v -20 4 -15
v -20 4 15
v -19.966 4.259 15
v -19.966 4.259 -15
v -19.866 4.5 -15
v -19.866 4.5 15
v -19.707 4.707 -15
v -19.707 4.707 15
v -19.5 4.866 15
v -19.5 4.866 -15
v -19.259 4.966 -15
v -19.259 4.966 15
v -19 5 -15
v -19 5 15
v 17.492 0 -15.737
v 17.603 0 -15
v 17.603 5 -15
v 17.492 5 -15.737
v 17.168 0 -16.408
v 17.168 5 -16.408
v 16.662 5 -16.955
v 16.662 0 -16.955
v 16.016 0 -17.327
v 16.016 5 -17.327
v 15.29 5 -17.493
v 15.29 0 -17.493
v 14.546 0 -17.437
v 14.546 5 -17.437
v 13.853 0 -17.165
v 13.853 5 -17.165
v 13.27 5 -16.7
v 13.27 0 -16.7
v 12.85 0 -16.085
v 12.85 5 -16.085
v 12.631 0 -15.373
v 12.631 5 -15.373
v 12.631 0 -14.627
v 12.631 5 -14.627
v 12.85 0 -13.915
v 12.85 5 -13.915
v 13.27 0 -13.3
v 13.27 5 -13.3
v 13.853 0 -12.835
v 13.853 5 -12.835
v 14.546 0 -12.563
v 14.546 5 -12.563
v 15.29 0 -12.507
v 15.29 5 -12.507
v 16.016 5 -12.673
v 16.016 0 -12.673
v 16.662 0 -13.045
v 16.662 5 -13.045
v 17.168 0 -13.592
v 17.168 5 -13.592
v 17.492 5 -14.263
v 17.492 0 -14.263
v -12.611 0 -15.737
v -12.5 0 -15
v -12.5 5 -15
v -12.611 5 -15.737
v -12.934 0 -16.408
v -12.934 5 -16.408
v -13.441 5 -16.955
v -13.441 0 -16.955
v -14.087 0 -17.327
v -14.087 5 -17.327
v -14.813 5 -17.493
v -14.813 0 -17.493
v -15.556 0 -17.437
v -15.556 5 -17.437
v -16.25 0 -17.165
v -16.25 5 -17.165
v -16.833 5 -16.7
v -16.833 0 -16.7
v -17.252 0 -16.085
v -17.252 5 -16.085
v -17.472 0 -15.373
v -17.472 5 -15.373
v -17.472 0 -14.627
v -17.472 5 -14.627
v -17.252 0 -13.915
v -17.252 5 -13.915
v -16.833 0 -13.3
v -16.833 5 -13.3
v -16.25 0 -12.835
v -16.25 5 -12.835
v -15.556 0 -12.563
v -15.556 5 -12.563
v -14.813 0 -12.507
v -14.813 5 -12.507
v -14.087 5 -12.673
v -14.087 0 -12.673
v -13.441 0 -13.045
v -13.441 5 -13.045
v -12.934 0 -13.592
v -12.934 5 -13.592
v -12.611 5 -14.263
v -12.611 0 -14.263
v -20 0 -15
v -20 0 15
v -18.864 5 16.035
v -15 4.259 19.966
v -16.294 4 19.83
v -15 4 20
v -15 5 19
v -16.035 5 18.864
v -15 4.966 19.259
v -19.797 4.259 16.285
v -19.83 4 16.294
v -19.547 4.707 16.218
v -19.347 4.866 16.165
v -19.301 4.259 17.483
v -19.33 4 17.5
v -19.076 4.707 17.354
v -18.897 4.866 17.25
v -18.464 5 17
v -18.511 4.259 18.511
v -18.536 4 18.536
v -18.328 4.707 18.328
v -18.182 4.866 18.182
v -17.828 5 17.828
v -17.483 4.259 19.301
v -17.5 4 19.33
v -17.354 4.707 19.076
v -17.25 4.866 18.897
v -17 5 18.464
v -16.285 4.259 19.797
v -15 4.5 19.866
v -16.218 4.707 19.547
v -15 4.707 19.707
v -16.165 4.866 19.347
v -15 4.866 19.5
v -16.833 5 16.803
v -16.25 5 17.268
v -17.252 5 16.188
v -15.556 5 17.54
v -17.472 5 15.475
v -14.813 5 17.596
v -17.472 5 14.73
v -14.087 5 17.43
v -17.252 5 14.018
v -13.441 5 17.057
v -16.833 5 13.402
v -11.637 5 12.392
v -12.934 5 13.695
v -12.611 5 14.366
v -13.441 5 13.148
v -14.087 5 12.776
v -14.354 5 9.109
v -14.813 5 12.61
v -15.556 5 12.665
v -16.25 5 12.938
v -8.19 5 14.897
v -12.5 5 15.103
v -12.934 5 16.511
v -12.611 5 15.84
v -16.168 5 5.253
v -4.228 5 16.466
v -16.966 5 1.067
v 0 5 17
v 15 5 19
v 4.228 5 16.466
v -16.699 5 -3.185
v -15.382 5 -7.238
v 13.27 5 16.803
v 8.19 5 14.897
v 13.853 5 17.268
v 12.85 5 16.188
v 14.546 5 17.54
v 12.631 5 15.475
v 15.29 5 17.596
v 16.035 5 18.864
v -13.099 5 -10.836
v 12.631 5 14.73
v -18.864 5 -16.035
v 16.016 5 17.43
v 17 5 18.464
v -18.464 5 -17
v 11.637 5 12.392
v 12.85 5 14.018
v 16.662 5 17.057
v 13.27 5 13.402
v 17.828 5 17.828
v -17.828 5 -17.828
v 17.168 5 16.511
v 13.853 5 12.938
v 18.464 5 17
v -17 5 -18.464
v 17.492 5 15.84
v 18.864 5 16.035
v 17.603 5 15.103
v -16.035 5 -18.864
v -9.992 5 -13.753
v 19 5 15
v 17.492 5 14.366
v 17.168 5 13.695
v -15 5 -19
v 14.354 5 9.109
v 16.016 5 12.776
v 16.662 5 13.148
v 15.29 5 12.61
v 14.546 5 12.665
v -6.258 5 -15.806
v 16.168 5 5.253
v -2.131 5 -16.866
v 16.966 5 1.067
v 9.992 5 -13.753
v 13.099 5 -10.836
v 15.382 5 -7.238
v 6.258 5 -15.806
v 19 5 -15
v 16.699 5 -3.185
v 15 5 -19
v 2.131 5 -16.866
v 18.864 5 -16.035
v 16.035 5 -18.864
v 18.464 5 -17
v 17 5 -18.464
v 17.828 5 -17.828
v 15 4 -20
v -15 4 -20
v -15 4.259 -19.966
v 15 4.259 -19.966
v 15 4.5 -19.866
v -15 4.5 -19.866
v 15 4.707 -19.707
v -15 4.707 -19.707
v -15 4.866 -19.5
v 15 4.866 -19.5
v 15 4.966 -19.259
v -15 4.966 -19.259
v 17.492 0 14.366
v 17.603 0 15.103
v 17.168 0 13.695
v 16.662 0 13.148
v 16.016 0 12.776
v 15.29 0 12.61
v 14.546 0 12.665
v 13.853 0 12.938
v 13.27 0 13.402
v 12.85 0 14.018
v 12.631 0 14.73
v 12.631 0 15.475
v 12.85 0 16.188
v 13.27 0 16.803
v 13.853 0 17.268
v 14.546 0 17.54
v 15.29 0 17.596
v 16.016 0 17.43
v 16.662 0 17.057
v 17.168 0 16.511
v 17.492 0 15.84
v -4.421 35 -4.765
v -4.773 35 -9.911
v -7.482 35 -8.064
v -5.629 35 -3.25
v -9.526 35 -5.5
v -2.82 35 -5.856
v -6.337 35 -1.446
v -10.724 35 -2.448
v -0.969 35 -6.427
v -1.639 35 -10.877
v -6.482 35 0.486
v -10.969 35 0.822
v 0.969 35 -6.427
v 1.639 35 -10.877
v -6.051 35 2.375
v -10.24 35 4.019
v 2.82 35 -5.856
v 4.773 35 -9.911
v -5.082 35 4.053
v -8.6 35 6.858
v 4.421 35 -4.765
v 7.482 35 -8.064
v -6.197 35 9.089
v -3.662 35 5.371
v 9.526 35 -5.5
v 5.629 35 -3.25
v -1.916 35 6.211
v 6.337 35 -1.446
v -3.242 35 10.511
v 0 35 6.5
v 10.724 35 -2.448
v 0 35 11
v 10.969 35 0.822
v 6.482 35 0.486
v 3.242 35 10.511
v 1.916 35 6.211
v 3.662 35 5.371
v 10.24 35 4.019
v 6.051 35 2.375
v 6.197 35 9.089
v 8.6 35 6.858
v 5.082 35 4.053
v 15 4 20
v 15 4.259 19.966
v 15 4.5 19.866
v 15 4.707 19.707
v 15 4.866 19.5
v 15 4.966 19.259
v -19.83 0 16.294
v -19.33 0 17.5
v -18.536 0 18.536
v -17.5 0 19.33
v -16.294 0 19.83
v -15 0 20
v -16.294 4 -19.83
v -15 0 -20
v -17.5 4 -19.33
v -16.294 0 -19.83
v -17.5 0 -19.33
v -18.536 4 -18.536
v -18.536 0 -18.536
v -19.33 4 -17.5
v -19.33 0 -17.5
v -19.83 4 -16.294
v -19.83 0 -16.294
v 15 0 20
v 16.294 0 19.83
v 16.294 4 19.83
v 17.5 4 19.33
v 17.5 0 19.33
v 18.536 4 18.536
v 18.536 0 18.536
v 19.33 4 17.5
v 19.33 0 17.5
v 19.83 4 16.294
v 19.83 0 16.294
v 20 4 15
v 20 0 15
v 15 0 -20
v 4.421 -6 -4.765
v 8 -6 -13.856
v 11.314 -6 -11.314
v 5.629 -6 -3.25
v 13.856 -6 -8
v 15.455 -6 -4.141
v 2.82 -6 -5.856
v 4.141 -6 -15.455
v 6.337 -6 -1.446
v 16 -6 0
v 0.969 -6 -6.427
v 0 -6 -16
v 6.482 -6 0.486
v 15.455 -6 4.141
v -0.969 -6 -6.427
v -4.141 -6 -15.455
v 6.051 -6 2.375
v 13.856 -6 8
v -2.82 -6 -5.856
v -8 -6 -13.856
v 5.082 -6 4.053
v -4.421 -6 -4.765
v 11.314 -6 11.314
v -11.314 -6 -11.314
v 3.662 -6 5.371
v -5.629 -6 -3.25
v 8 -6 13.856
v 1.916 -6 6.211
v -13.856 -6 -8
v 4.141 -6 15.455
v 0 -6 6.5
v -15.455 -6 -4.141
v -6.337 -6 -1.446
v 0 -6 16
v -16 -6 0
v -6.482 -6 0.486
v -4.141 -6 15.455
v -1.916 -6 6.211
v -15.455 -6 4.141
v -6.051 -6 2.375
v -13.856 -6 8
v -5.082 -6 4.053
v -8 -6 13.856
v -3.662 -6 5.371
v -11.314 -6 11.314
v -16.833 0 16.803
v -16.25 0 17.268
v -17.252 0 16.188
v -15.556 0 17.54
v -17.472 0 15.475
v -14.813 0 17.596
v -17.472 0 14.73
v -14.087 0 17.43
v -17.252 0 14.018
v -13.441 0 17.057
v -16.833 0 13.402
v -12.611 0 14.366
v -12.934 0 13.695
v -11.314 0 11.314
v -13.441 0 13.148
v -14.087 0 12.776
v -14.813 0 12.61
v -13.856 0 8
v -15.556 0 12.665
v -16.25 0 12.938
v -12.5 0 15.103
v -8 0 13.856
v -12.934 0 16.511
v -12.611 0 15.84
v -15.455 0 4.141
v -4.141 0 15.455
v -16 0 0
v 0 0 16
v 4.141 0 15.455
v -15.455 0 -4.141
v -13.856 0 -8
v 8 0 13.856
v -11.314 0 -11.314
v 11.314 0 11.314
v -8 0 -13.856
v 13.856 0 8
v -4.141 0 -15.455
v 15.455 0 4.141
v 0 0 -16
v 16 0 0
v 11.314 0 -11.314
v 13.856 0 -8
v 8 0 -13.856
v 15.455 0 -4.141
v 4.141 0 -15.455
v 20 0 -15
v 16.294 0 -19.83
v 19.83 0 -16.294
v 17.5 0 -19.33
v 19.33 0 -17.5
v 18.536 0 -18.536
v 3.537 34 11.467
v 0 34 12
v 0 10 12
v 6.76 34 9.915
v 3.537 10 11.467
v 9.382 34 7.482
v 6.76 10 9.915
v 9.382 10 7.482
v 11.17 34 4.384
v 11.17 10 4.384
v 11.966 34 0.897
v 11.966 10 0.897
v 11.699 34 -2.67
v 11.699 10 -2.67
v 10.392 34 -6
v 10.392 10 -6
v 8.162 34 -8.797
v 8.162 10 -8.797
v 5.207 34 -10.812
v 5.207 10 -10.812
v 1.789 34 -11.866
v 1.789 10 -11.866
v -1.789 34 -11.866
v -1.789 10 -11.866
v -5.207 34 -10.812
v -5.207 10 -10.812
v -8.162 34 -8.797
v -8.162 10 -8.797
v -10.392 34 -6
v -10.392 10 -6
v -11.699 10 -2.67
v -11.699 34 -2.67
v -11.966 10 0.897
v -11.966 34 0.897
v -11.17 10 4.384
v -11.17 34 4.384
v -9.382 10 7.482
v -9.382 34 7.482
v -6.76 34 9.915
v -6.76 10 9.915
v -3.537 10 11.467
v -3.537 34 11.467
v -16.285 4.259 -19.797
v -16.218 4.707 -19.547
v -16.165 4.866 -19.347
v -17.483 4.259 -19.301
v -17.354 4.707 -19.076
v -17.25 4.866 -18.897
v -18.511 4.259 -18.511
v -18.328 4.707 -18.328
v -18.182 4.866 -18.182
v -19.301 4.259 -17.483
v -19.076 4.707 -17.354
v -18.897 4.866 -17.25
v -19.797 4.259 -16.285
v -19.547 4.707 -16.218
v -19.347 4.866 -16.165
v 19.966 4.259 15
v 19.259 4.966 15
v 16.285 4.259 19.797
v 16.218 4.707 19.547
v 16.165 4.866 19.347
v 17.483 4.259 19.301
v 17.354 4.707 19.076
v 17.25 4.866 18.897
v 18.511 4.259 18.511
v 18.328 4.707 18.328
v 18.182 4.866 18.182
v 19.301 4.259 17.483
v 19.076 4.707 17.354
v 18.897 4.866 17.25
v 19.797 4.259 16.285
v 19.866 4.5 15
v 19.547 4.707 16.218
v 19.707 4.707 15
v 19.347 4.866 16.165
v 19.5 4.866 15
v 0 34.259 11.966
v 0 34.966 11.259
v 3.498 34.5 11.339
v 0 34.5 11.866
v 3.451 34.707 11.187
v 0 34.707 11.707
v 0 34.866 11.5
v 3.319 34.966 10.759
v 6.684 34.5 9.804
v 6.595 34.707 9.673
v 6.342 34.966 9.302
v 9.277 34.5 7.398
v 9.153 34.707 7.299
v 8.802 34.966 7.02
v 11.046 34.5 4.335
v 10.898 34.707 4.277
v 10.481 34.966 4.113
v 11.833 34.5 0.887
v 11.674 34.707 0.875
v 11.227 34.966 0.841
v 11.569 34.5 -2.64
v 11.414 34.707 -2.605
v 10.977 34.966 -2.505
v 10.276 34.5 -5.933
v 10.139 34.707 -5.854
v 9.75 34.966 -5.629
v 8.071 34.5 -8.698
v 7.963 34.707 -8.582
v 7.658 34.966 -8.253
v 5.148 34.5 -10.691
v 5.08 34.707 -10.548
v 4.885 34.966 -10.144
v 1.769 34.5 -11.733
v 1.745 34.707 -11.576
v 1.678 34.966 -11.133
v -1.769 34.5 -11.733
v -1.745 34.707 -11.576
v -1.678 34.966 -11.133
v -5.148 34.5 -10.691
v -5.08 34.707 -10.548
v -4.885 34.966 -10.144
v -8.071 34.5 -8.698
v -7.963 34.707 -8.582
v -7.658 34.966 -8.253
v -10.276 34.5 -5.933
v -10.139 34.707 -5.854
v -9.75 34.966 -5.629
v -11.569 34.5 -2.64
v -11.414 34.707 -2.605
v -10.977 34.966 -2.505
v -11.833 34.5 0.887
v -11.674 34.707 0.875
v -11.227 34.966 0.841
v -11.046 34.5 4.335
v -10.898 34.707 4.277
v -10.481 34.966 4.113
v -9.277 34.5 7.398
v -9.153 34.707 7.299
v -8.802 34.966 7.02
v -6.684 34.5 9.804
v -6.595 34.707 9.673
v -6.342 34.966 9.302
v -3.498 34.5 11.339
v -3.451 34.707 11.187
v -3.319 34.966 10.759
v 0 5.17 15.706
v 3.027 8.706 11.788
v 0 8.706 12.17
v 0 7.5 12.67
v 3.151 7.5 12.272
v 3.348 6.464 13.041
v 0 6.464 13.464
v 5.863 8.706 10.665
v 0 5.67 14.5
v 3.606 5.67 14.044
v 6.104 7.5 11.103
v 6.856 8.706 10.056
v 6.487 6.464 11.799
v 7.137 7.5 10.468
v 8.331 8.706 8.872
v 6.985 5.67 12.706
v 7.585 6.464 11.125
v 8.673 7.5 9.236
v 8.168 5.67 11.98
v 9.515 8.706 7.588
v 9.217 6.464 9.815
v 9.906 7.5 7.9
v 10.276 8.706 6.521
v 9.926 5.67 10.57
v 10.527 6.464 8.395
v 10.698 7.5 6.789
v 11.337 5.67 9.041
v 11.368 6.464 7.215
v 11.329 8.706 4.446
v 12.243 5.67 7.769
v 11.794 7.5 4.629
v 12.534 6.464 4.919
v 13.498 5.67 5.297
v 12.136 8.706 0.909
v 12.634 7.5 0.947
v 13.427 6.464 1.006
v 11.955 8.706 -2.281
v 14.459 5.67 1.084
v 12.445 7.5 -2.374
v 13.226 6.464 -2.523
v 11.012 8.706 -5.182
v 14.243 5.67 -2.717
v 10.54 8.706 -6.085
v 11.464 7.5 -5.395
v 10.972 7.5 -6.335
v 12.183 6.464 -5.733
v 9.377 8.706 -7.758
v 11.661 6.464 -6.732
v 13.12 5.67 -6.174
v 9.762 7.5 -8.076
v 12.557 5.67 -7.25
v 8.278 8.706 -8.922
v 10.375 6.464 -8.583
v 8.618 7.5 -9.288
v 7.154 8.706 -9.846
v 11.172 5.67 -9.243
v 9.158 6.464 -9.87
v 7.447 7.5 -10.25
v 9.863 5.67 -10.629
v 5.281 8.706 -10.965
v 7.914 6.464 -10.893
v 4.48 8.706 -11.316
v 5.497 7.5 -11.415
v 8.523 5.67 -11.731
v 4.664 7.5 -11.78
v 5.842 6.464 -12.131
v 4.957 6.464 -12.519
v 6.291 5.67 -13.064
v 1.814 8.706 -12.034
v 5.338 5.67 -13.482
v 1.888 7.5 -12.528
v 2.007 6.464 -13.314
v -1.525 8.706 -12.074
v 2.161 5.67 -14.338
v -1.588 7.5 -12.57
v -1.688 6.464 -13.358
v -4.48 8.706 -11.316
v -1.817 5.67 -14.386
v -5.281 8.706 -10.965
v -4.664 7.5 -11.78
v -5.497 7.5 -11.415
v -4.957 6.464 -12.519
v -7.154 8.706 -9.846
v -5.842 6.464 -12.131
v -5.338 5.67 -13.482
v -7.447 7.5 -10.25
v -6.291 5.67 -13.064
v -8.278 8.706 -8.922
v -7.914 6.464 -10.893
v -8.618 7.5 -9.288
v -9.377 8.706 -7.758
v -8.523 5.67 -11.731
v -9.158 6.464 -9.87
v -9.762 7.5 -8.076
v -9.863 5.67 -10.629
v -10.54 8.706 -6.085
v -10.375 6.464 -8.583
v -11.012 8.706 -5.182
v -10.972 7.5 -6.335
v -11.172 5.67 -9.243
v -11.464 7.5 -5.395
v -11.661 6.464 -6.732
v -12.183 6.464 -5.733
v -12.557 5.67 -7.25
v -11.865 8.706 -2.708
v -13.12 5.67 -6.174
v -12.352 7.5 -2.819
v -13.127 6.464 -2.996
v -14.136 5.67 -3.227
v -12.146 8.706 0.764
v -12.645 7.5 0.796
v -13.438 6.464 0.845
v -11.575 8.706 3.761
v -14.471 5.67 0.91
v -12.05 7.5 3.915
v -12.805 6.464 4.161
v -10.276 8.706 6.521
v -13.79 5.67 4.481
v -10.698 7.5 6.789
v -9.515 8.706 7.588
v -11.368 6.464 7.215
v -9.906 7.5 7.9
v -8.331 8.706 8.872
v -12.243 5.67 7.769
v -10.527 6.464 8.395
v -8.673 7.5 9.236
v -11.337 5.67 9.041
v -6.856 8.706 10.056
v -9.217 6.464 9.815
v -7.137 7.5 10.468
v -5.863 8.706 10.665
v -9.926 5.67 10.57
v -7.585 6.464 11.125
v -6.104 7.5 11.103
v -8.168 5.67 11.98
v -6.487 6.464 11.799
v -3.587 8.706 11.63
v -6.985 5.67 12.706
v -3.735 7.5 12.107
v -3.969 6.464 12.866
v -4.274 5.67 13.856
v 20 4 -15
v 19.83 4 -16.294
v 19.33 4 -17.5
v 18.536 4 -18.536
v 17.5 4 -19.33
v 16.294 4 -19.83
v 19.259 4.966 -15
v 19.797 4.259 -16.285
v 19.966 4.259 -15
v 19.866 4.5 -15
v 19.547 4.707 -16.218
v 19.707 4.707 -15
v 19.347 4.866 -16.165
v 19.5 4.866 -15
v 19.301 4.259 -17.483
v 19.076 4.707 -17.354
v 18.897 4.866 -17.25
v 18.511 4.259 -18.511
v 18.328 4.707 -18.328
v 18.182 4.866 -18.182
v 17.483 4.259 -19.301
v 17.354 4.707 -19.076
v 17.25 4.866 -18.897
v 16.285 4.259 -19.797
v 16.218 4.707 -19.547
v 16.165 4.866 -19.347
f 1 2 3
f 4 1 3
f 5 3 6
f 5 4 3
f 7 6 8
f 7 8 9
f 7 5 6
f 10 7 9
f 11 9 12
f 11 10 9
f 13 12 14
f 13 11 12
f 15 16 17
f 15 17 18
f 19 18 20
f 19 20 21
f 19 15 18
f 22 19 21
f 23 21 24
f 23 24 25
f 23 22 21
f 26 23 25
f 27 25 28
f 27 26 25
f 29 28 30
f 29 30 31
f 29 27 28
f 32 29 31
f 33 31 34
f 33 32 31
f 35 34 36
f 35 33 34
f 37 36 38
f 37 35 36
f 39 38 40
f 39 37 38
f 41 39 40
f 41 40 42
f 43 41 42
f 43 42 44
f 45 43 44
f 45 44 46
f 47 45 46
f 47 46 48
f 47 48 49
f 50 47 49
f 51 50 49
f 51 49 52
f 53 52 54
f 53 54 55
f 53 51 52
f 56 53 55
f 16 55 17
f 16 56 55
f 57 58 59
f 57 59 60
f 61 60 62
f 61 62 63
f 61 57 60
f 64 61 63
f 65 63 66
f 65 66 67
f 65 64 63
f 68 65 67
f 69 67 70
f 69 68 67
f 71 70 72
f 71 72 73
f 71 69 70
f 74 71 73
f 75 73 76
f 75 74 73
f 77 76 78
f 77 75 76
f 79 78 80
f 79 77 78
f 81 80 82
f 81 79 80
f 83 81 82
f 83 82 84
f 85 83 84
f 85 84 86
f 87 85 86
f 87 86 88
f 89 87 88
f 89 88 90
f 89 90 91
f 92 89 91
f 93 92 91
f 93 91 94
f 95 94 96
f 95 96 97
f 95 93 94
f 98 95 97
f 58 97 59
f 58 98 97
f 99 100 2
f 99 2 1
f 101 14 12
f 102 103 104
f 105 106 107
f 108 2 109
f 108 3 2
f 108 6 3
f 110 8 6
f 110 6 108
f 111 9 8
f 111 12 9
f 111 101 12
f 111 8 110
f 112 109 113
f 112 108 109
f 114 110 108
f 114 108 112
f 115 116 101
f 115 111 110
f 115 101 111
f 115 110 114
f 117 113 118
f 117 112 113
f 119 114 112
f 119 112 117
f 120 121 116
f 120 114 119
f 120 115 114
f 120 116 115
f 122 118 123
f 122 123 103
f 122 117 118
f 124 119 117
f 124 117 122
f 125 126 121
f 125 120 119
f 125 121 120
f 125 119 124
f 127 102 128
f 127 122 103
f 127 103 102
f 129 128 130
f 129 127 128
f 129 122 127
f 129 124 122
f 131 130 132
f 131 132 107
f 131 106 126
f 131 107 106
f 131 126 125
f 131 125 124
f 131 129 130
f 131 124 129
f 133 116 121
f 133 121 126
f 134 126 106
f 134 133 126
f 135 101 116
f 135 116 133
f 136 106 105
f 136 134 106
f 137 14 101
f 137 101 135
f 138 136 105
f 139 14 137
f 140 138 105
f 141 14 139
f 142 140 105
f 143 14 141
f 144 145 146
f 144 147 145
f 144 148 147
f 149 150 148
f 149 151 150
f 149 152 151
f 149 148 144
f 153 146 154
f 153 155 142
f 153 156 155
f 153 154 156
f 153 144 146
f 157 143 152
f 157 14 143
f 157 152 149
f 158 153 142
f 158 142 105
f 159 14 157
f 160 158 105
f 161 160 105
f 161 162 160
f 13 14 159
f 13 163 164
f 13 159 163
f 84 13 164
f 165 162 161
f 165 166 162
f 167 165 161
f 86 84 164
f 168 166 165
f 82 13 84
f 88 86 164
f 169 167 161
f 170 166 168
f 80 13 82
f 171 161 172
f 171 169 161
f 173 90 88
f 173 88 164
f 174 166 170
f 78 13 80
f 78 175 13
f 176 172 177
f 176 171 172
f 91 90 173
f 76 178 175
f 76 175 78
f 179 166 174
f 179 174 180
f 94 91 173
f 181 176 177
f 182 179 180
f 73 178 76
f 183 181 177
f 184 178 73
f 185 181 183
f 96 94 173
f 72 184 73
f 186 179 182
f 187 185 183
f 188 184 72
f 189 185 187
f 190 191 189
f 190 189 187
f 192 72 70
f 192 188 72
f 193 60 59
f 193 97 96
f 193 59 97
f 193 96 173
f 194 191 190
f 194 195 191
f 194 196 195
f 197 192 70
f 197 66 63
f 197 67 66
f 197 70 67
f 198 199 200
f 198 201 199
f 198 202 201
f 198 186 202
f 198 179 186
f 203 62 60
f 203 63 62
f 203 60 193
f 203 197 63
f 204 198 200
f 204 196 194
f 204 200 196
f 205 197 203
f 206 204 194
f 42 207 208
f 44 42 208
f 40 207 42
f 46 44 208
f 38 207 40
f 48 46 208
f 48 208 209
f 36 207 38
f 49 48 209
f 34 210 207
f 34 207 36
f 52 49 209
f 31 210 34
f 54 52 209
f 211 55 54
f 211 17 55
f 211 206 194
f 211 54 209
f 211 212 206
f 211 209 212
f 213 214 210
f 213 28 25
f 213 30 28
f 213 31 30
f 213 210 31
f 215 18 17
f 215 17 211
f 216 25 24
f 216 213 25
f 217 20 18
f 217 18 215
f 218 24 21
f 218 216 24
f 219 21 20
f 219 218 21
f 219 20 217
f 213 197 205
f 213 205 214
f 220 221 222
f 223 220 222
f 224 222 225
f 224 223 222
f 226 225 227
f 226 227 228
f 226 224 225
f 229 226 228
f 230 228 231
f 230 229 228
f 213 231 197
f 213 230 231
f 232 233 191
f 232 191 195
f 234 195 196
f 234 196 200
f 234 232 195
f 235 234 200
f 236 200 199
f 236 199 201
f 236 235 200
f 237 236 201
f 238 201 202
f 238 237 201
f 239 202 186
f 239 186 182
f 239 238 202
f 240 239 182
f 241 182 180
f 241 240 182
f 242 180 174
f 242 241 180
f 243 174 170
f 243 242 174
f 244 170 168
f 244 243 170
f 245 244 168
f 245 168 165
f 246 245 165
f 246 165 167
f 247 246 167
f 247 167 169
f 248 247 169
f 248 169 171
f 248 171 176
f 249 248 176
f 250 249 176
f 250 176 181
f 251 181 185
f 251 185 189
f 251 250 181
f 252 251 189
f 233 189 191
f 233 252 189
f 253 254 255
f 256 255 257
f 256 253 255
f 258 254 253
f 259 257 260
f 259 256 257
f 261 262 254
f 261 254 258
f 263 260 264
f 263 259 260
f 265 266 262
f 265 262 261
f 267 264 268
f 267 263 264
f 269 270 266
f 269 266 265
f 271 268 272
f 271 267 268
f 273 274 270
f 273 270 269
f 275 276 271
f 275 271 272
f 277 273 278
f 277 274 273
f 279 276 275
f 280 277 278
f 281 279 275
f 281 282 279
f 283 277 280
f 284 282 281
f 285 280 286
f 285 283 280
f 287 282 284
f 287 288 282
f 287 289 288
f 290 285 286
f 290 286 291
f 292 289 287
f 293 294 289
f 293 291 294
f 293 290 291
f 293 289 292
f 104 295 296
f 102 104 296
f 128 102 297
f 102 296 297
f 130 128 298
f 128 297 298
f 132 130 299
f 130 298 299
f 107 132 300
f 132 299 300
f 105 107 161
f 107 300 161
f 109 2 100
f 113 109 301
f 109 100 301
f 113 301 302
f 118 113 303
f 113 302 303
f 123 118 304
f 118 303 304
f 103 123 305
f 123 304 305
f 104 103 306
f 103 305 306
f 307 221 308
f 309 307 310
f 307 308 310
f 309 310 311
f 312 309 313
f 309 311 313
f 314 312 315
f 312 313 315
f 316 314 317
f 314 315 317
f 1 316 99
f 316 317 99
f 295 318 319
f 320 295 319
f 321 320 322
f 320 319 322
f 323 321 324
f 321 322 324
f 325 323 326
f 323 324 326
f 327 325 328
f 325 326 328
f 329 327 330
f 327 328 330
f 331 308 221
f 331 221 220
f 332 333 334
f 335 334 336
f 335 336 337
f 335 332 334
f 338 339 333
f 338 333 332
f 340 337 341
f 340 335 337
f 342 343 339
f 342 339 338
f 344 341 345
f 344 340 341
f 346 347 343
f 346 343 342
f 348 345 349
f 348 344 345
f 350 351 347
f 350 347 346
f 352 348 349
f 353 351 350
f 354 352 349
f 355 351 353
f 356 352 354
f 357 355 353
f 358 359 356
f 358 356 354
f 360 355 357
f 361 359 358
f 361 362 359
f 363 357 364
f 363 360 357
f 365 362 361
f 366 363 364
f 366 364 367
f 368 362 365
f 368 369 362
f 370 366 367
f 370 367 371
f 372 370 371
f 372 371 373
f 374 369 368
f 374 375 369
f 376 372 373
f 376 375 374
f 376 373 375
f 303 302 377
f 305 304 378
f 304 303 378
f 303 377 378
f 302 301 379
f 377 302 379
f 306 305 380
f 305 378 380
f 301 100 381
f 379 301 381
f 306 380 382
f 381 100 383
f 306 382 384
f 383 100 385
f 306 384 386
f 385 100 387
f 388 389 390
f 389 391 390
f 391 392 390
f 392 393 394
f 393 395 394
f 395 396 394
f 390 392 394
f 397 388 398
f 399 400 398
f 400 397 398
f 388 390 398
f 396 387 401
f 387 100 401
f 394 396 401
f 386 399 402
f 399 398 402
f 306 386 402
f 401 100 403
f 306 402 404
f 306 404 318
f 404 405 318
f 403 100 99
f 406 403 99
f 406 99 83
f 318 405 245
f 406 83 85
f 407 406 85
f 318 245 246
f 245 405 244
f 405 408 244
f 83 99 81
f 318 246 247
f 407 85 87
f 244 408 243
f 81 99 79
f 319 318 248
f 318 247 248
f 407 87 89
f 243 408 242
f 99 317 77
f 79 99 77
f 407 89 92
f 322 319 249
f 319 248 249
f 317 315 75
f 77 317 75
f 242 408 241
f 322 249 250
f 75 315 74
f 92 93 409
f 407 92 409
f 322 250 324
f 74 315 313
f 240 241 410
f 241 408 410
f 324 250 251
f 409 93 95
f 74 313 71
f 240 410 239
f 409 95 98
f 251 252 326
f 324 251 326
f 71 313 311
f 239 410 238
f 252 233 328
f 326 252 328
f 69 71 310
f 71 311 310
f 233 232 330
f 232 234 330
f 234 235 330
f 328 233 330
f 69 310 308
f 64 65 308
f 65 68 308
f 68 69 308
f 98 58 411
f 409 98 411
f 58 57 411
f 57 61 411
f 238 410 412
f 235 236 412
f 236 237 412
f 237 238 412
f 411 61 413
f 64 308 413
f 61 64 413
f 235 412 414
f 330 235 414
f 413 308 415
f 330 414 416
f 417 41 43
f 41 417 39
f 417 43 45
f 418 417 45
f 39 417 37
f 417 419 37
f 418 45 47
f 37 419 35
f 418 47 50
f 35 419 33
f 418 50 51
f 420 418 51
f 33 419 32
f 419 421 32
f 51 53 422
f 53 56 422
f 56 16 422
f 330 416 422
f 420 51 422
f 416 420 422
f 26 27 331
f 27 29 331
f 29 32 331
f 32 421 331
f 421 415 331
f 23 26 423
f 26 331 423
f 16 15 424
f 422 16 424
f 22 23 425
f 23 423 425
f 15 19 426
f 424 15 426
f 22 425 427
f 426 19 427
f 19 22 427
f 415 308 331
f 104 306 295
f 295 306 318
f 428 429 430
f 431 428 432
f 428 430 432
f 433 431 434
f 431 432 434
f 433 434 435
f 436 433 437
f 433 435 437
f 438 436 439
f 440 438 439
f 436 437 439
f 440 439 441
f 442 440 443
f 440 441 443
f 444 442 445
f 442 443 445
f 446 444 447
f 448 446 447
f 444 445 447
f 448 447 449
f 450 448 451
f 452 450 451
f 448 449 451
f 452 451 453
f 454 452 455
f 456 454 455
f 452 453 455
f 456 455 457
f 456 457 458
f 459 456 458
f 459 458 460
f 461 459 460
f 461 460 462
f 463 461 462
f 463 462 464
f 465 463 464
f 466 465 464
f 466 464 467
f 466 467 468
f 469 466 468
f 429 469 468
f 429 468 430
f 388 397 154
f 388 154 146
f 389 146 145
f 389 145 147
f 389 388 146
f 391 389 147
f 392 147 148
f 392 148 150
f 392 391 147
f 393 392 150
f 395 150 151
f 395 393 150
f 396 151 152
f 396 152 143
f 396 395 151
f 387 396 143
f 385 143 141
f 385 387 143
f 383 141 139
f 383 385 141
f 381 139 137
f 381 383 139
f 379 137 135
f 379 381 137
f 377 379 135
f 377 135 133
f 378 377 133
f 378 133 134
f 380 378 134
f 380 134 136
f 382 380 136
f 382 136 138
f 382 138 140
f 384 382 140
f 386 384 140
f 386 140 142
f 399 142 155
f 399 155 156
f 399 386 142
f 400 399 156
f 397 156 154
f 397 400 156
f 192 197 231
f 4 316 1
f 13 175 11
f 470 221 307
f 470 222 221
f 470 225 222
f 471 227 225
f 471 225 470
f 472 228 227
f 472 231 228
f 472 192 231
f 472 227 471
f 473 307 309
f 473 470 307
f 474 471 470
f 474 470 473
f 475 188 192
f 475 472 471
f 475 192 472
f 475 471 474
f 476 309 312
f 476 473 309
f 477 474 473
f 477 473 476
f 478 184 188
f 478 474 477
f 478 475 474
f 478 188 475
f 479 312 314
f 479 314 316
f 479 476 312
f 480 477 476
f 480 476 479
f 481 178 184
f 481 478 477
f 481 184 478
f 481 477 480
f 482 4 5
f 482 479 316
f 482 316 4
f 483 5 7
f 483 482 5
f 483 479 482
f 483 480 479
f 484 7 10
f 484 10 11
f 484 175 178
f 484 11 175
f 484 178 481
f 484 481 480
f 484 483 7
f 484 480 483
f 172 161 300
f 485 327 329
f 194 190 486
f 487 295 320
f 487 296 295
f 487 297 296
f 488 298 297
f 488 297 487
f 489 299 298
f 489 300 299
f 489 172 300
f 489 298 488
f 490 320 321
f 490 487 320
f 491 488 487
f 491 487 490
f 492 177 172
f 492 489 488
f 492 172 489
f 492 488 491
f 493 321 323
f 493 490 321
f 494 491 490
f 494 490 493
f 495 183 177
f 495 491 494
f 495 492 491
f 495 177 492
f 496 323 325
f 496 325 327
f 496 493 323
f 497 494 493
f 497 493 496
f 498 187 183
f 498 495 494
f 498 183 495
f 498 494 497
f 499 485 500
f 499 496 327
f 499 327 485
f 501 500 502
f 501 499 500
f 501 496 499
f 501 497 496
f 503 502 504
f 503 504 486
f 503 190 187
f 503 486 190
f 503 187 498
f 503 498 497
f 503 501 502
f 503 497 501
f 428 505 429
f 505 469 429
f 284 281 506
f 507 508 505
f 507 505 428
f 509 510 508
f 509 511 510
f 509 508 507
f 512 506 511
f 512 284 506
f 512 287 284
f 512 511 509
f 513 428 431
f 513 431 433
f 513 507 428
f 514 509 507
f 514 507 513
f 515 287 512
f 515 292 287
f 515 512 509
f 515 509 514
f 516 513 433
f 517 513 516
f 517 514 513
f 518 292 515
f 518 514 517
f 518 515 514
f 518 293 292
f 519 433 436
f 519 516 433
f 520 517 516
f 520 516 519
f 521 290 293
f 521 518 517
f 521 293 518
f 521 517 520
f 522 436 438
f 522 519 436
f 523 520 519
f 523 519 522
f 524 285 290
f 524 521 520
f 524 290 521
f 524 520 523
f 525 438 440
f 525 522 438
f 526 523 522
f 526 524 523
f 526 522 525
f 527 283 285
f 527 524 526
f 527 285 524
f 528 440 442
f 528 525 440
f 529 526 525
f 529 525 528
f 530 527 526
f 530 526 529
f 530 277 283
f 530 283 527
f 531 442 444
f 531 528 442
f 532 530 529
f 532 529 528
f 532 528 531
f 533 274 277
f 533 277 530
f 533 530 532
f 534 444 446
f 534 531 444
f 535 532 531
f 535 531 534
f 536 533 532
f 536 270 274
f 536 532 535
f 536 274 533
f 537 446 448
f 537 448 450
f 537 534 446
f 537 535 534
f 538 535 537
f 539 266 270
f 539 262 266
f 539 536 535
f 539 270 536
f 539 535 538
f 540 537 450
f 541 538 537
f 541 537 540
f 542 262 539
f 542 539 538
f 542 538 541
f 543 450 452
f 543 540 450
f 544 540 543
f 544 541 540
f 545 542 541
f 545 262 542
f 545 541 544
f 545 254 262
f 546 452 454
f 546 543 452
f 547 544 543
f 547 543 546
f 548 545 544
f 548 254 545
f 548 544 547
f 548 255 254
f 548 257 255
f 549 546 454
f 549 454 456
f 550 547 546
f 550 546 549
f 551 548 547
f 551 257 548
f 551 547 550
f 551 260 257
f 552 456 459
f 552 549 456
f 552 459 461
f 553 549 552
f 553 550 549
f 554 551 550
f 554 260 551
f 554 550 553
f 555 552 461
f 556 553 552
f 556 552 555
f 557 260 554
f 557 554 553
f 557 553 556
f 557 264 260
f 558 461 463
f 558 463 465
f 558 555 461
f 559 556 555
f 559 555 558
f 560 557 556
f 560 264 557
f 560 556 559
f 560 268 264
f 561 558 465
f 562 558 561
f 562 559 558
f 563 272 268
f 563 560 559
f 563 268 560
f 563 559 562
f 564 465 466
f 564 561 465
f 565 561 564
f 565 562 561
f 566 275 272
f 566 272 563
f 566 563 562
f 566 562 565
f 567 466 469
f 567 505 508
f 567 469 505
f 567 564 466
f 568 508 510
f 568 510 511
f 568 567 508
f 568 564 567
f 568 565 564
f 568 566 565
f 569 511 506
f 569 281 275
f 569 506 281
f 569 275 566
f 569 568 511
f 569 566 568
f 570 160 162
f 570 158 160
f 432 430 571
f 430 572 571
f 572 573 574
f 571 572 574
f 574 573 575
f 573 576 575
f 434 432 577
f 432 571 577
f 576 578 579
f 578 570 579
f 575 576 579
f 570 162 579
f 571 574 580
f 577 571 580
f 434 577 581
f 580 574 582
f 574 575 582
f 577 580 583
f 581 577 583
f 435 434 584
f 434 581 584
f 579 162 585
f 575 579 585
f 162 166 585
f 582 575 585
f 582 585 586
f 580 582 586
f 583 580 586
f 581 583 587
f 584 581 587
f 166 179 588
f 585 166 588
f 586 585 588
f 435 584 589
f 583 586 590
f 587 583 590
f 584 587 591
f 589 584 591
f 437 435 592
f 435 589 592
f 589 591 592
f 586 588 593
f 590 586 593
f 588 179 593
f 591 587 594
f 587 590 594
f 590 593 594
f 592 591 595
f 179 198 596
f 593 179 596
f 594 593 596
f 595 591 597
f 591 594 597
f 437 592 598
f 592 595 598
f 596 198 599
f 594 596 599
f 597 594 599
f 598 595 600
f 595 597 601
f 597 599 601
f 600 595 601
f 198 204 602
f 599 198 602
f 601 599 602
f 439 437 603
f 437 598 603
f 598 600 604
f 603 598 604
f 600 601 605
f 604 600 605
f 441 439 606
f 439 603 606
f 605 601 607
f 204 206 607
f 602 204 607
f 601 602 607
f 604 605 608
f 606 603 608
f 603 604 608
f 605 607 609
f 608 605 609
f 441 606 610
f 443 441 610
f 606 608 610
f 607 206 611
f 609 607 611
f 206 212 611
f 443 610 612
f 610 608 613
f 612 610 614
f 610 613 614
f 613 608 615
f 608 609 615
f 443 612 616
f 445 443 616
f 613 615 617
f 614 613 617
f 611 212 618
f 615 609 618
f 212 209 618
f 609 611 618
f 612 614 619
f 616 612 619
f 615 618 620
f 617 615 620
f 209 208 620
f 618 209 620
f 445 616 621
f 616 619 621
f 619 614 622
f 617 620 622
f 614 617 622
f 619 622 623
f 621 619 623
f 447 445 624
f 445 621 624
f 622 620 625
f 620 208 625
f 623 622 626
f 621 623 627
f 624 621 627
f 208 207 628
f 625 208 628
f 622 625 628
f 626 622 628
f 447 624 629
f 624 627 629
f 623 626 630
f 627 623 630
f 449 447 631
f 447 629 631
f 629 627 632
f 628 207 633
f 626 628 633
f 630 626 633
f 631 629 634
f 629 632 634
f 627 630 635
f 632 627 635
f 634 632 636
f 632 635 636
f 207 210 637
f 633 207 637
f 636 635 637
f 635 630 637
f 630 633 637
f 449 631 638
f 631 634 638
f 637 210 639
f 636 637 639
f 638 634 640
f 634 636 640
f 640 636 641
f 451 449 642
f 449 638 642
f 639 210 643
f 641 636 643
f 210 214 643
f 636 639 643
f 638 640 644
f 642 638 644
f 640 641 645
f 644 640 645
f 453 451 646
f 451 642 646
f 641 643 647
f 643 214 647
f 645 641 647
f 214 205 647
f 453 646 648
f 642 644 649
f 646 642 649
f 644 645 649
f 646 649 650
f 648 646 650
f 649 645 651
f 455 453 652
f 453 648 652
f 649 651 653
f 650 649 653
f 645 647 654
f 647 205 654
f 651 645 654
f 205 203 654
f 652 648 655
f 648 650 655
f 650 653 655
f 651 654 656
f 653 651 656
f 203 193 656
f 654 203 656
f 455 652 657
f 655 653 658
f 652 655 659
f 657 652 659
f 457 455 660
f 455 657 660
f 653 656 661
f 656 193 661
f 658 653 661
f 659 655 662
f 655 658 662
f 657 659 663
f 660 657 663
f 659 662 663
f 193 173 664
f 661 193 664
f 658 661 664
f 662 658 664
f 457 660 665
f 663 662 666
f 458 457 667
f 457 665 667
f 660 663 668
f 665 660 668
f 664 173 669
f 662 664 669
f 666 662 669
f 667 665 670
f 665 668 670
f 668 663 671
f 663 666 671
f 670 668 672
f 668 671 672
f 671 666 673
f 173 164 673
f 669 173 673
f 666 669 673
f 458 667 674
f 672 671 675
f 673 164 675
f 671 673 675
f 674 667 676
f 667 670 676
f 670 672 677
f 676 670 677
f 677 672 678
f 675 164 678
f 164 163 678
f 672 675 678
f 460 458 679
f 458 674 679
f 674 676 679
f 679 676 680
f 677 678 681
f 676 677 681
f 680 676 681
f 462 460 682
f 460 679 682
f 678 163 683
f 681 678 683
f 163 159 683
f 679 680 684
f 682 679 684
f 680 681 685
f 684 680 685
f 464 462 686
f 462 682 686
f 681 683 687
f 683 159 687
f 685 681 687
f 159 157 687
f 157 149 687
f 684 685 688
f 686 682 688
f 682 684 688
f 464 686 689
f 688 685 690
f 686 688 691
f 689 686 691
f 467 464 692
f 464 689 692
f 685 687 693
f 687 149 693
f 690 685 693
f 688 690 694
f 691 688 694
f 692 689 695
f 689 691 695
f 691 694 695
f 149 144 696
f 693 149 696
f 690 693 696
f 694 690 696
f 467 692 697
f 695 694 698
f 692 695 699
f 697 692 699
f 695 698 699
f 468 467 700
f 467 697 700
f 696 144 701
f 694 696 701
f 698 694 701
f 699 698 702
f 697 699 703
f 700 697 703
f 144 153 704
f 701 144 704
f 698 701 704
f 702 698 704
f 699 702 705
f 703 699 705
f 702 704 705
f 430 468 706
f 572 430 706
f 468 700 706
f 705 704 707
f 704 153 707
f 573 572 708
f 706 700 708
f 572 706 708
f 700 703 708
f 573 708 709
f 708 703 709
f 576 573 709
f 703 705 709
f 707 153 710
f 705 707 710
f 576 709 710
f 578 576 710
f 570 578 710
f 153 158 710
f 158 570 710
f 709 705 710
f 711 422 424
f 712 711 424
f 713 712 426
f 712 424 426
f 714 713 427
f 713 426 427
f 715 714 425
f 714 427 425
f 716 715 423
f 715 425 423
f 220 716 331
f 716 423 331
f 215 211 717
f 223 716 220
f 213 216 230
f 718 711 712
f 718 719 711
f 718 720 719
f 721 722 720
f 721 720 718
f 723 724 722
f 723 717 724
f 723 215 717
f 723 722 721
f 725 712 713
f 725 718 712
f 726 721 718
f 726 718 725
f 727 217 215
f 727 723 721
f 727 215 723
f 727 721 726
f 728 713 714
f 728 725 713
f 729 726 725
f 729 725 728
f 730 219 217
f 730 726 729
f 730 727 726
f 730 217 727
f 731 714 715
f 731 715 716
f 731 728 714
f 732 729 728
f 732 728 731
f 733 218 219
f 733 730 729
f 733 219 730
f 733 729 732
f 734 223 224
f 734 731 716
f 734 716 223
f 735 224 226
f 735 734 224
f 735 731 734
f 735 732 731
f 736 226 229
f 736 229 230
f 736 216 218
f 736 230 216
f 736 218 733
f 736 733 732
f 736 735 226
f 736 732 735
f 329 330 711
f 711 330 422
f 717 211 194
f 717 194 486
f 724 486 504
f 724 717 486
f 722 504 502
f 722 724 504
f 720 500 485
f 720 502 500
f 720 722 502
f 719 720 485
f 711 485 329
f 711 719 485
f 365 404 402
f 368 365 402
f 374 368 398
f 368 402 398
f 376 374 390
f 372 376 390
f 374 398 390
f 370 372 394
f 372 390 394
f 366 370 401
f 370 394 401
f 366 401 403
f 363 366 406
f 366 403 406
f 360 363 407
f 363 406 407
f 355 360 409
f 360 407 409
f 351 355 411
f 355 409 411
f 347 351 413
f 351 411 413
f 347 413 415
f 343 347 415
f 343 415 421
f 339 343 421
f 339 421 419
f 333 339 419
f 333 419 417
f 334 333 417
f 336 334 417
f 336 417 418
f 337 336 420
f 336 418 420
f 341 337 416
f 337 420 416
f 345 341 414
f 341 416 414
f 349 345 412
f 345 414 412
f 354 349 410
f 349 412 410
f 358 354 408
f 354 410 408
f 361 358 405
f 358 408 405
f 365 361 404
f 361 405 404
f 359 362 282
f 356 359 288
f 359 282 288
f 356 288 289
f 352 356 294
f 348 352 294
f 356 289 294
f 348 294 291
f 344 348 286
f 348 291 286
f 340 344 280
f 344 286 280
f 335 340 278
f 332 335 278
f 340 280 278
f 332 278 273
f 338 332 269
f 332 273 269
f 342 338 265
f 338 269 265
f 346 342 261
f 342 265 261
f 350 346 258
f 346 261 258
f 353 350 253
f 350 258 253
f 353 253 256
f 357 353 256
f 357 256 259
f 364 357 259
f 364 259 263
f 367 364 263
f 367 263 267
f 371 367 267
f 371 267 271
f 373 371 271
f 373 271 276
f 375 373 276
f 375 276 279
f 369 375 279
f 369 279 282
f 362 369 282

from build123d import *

# Parameters (mm, degrees)
BOSS_EXTRUDE13_OUTLINE_W = 40
BOSS_EXTRUDE13_OUTLINE_H = 40
BOSS_EXTRUDE13_OUTLINE_R = 2.5
BOSS_EXTRUDE13_DEPTH     = 5
SKETCH3_R                = 12
BOSS_EXTRUDE17_DEPTH     = 30
FILLET2_R                = 1
FILLET3_R                = 5
FILLET4_R                = 1
SKETCH6_R                = 16
BOSS_EXTRUDE18_DEPTH     = 6
SKETCH5_R                = 6.5
CUT_EXTRUDE2_DEPTH       = 55


# Read off the part's stored shape, not the designer's step: Boss-Extrude13
with BuildPart() as part:
    # Boss-Extrude13 outline → Boss-Extrude13 (new body)
    with BuildSketch(Plane(origin=(0, 0, 0), x_dir=(1, 0, 0), z_dir=(0, 1, 0))):
        Rectangle(BOSS_EXTRUDE13_OUTLINE_W, BOSS_EXTRUDE13_OUTLINE_H)
        with Locations((-15, -15.102802021)):
            Circle(BOSS_EXTRUDE13_OUTLINE_R, mode=Mode.SUBTRACT)
        with Locations((15.102802021, -15.102802021)):
            Circle(BOSS_EXTRUDE13_OUTLINE_R, mode=Mode.SUBTRACT)
        with Locations((-15, 15)):
            Circle(BOSS_EXTRUDE13_OUTLINE_R, mode=Mode.SUBTRACT)
        with Locations((15.102802021, 15)):
            Circle(BOSS_EXTRUDE13_OUTLINE_R, mode=Mode.SUBTRACT)
    extrude(amount=BOSS_EXTRUDE13_DEPTH)

    # Sketch3 → Boss-Extrude17 (add)
    with BuildSketch(Plane(origin=(0, 5, 0), x_dir=(1, 0, 0), z_dir=(0, 1, 0))):
        with Locations(Location((0, 0, 0), (0, 0, 270))):
            Circle(SKETCH3_R)
    extrude(amount=BOSS_EXTRUDE17_DEPTH)

    # Fillet2
    fillet2_edges = [part.edges().sort_by_distance(p)[0] for p in [
        (20, 5, 0),
        (0, 5, -20),
        (-20, 5, 0),
        (0, 5, 20),
    ]]
    fillet(fillet2_edges, radius=FILLET2_R)

    # Fillet3
    # the kernel refuses this fillet: 5 mm, written as the material it adds along each edge
    with BuildSketch(Plane(origin=(0, 5, 0), x_dir=(0, 0, 1), z_dir=(-1, 0, 0))) as fillet3_piece_1:
        with BuildLine():
            CenterArc((12 + FILLET3_R, FILLET3_R), FILLET3_R, 180, 90)
            Line((12, FILLET3_R), (12, 0))
            Line((12, 0), (12 + FILLET3_R, 0))
        make_face()
    revolve(axis=Axis((0, 5, 0), (0, 1, 0)))
    # the kernel refuses this fillet: 5 mm, written as the material it takes off along each edge
    with BuildSketch(Plane(origin=(-15, 5, -15), x_dir=(0, 0, -1), z_dir=(1, 0, 0))) as fillet3_2_piece_1:
        with BuildLine():
            CenterArc((4, -1), 1, 0, 90)
            Line((5, -1), (5, 0))
            Line((5, 0), (4, 0))
        make_face()
    revolve(axis=Axis((-15, 5, -15), (0, 1, 0)), revolution_arc=90, mode=Mode.SUBTRACT)
    with BuildSketch(Plane(origin=(15, 5, -15), x_dir=(1, 0, 0), z_dir=(0, 0, 1))) as fillet3_2_piece_2:
        with BuildLine():
            CenterArc((4, -1), 1, 0, 90)
            Line((5, -1), (5, 0))
            Line((5, 0), (4, 0))
        make_face()
    revolve(axis=Axis((15, 5, -15), (0, 1, 0)), revolution_arc=90, mode=Mode.SUBTRACT)
    with BuildSketch(Plane(origin=(-15, 5, 15), x_dir=(-1, 0, 0), z_dir=(0, 0, -1))) as fillet3_2_piece_3:
        with BuildLine():
            CenterArc((4, -1), 1, 0, 90)
            Line((5, -1), (5, 0))
            Line((5, 0), (4, 0))
        make_face()
    revolve(axis=Axis((-15, 5, 15), (0, 1, 0)), revolution_arc=90, mode=Mode.SUBTRACT)
    with BuildSketch(Plane(origin=(15, 5, 15), x_dir=(0, 0, 1), z_dir=(-1, 0, 0))) as fillet3_2_piece_4:
        with BuildLine():
            CenterArc((4, -1), 1, 0, 90)
            Line((5, -1), (5, 0))
            Line((5, 0), (4, 0))
        make_face()
    revolve(axis=Axis((15, 5, 15), (0, 1, 0)), revolution_arc=90, mode=Mode.SUBTRACT)
    with BuildSketch(Plane(origin=(20, -12.5, 20), x_dir=(-1, 0, 0), z_dir=(0, 1, 0)), Plane(origin=(20, -12.5, -20), x_dir=(0, 0, 1), z_dir=(0, 1, 0))) as fillet3_2_piece_5:
        with BuildLine():
            CenterArc((FILLET3_R, -FILLET3_R), FILLET3_R, 90, 90)
            Line((0, -FILLET3_R), (0, 0))
            Line((0, 0), (FILLET3_R, 0))
        make_face()
    extrude(amount=17.5, mode=Mode.SUBTRACT)
    with BuildSketch(Plane(origin=(-20, -12.5, 20), x_dir=(1, 0, 0), z_dir=(0, 1, 0)), Plane(origin=(-20, -12.5, -20), x_dir=(0, 0, 1), z_dir=(0, 1, 0))) as fillet3_2_piece_6:
        with BuildLine():
            CenterArc((FILLET3_R, FILLET3_R), FILLET3_R, 180, 90)
            Line((0, FILLET3_R), (0, 0))
            Line((0, 0), (FILLET3_R, 0))
        make_face()
    extrude(amount=17.5, mode=Mode.SUBTRACT)

    # Fillet4
    fillet4_edges = [part.edges().sort_by_distance(p)[0] for p in [
        (0, 35, -12),
    ]]
    fillet(fillet4_edges, radius=FILLET4_R)

    # Sketch6 → Boss-Extrude18 (add)
    with BuildSketch(Plane.XZ):
        with Locations(Location((0, 0, 0), (0, 0, 90))):
            Circle(SKETCH6_R)
    extrude(amount=BOSS_EXTRUDE18_DEPTH)

    # Sketch5 → Cut-Extrude2 (cut)
    with BuildSketch(Plane(origin=(0, 35, 0), x_dir=(1, 0, 0), z_dir=(0, 1, 0))):
        with Locations(Location((0, 0, 0), (0, 0, 270))):
            Circle(SKETCH5_R)
    extrude(amount=-CUT_EXTRUDE2_DEPTH, mode=Mode.SUBTRACT)


solid = part.part
